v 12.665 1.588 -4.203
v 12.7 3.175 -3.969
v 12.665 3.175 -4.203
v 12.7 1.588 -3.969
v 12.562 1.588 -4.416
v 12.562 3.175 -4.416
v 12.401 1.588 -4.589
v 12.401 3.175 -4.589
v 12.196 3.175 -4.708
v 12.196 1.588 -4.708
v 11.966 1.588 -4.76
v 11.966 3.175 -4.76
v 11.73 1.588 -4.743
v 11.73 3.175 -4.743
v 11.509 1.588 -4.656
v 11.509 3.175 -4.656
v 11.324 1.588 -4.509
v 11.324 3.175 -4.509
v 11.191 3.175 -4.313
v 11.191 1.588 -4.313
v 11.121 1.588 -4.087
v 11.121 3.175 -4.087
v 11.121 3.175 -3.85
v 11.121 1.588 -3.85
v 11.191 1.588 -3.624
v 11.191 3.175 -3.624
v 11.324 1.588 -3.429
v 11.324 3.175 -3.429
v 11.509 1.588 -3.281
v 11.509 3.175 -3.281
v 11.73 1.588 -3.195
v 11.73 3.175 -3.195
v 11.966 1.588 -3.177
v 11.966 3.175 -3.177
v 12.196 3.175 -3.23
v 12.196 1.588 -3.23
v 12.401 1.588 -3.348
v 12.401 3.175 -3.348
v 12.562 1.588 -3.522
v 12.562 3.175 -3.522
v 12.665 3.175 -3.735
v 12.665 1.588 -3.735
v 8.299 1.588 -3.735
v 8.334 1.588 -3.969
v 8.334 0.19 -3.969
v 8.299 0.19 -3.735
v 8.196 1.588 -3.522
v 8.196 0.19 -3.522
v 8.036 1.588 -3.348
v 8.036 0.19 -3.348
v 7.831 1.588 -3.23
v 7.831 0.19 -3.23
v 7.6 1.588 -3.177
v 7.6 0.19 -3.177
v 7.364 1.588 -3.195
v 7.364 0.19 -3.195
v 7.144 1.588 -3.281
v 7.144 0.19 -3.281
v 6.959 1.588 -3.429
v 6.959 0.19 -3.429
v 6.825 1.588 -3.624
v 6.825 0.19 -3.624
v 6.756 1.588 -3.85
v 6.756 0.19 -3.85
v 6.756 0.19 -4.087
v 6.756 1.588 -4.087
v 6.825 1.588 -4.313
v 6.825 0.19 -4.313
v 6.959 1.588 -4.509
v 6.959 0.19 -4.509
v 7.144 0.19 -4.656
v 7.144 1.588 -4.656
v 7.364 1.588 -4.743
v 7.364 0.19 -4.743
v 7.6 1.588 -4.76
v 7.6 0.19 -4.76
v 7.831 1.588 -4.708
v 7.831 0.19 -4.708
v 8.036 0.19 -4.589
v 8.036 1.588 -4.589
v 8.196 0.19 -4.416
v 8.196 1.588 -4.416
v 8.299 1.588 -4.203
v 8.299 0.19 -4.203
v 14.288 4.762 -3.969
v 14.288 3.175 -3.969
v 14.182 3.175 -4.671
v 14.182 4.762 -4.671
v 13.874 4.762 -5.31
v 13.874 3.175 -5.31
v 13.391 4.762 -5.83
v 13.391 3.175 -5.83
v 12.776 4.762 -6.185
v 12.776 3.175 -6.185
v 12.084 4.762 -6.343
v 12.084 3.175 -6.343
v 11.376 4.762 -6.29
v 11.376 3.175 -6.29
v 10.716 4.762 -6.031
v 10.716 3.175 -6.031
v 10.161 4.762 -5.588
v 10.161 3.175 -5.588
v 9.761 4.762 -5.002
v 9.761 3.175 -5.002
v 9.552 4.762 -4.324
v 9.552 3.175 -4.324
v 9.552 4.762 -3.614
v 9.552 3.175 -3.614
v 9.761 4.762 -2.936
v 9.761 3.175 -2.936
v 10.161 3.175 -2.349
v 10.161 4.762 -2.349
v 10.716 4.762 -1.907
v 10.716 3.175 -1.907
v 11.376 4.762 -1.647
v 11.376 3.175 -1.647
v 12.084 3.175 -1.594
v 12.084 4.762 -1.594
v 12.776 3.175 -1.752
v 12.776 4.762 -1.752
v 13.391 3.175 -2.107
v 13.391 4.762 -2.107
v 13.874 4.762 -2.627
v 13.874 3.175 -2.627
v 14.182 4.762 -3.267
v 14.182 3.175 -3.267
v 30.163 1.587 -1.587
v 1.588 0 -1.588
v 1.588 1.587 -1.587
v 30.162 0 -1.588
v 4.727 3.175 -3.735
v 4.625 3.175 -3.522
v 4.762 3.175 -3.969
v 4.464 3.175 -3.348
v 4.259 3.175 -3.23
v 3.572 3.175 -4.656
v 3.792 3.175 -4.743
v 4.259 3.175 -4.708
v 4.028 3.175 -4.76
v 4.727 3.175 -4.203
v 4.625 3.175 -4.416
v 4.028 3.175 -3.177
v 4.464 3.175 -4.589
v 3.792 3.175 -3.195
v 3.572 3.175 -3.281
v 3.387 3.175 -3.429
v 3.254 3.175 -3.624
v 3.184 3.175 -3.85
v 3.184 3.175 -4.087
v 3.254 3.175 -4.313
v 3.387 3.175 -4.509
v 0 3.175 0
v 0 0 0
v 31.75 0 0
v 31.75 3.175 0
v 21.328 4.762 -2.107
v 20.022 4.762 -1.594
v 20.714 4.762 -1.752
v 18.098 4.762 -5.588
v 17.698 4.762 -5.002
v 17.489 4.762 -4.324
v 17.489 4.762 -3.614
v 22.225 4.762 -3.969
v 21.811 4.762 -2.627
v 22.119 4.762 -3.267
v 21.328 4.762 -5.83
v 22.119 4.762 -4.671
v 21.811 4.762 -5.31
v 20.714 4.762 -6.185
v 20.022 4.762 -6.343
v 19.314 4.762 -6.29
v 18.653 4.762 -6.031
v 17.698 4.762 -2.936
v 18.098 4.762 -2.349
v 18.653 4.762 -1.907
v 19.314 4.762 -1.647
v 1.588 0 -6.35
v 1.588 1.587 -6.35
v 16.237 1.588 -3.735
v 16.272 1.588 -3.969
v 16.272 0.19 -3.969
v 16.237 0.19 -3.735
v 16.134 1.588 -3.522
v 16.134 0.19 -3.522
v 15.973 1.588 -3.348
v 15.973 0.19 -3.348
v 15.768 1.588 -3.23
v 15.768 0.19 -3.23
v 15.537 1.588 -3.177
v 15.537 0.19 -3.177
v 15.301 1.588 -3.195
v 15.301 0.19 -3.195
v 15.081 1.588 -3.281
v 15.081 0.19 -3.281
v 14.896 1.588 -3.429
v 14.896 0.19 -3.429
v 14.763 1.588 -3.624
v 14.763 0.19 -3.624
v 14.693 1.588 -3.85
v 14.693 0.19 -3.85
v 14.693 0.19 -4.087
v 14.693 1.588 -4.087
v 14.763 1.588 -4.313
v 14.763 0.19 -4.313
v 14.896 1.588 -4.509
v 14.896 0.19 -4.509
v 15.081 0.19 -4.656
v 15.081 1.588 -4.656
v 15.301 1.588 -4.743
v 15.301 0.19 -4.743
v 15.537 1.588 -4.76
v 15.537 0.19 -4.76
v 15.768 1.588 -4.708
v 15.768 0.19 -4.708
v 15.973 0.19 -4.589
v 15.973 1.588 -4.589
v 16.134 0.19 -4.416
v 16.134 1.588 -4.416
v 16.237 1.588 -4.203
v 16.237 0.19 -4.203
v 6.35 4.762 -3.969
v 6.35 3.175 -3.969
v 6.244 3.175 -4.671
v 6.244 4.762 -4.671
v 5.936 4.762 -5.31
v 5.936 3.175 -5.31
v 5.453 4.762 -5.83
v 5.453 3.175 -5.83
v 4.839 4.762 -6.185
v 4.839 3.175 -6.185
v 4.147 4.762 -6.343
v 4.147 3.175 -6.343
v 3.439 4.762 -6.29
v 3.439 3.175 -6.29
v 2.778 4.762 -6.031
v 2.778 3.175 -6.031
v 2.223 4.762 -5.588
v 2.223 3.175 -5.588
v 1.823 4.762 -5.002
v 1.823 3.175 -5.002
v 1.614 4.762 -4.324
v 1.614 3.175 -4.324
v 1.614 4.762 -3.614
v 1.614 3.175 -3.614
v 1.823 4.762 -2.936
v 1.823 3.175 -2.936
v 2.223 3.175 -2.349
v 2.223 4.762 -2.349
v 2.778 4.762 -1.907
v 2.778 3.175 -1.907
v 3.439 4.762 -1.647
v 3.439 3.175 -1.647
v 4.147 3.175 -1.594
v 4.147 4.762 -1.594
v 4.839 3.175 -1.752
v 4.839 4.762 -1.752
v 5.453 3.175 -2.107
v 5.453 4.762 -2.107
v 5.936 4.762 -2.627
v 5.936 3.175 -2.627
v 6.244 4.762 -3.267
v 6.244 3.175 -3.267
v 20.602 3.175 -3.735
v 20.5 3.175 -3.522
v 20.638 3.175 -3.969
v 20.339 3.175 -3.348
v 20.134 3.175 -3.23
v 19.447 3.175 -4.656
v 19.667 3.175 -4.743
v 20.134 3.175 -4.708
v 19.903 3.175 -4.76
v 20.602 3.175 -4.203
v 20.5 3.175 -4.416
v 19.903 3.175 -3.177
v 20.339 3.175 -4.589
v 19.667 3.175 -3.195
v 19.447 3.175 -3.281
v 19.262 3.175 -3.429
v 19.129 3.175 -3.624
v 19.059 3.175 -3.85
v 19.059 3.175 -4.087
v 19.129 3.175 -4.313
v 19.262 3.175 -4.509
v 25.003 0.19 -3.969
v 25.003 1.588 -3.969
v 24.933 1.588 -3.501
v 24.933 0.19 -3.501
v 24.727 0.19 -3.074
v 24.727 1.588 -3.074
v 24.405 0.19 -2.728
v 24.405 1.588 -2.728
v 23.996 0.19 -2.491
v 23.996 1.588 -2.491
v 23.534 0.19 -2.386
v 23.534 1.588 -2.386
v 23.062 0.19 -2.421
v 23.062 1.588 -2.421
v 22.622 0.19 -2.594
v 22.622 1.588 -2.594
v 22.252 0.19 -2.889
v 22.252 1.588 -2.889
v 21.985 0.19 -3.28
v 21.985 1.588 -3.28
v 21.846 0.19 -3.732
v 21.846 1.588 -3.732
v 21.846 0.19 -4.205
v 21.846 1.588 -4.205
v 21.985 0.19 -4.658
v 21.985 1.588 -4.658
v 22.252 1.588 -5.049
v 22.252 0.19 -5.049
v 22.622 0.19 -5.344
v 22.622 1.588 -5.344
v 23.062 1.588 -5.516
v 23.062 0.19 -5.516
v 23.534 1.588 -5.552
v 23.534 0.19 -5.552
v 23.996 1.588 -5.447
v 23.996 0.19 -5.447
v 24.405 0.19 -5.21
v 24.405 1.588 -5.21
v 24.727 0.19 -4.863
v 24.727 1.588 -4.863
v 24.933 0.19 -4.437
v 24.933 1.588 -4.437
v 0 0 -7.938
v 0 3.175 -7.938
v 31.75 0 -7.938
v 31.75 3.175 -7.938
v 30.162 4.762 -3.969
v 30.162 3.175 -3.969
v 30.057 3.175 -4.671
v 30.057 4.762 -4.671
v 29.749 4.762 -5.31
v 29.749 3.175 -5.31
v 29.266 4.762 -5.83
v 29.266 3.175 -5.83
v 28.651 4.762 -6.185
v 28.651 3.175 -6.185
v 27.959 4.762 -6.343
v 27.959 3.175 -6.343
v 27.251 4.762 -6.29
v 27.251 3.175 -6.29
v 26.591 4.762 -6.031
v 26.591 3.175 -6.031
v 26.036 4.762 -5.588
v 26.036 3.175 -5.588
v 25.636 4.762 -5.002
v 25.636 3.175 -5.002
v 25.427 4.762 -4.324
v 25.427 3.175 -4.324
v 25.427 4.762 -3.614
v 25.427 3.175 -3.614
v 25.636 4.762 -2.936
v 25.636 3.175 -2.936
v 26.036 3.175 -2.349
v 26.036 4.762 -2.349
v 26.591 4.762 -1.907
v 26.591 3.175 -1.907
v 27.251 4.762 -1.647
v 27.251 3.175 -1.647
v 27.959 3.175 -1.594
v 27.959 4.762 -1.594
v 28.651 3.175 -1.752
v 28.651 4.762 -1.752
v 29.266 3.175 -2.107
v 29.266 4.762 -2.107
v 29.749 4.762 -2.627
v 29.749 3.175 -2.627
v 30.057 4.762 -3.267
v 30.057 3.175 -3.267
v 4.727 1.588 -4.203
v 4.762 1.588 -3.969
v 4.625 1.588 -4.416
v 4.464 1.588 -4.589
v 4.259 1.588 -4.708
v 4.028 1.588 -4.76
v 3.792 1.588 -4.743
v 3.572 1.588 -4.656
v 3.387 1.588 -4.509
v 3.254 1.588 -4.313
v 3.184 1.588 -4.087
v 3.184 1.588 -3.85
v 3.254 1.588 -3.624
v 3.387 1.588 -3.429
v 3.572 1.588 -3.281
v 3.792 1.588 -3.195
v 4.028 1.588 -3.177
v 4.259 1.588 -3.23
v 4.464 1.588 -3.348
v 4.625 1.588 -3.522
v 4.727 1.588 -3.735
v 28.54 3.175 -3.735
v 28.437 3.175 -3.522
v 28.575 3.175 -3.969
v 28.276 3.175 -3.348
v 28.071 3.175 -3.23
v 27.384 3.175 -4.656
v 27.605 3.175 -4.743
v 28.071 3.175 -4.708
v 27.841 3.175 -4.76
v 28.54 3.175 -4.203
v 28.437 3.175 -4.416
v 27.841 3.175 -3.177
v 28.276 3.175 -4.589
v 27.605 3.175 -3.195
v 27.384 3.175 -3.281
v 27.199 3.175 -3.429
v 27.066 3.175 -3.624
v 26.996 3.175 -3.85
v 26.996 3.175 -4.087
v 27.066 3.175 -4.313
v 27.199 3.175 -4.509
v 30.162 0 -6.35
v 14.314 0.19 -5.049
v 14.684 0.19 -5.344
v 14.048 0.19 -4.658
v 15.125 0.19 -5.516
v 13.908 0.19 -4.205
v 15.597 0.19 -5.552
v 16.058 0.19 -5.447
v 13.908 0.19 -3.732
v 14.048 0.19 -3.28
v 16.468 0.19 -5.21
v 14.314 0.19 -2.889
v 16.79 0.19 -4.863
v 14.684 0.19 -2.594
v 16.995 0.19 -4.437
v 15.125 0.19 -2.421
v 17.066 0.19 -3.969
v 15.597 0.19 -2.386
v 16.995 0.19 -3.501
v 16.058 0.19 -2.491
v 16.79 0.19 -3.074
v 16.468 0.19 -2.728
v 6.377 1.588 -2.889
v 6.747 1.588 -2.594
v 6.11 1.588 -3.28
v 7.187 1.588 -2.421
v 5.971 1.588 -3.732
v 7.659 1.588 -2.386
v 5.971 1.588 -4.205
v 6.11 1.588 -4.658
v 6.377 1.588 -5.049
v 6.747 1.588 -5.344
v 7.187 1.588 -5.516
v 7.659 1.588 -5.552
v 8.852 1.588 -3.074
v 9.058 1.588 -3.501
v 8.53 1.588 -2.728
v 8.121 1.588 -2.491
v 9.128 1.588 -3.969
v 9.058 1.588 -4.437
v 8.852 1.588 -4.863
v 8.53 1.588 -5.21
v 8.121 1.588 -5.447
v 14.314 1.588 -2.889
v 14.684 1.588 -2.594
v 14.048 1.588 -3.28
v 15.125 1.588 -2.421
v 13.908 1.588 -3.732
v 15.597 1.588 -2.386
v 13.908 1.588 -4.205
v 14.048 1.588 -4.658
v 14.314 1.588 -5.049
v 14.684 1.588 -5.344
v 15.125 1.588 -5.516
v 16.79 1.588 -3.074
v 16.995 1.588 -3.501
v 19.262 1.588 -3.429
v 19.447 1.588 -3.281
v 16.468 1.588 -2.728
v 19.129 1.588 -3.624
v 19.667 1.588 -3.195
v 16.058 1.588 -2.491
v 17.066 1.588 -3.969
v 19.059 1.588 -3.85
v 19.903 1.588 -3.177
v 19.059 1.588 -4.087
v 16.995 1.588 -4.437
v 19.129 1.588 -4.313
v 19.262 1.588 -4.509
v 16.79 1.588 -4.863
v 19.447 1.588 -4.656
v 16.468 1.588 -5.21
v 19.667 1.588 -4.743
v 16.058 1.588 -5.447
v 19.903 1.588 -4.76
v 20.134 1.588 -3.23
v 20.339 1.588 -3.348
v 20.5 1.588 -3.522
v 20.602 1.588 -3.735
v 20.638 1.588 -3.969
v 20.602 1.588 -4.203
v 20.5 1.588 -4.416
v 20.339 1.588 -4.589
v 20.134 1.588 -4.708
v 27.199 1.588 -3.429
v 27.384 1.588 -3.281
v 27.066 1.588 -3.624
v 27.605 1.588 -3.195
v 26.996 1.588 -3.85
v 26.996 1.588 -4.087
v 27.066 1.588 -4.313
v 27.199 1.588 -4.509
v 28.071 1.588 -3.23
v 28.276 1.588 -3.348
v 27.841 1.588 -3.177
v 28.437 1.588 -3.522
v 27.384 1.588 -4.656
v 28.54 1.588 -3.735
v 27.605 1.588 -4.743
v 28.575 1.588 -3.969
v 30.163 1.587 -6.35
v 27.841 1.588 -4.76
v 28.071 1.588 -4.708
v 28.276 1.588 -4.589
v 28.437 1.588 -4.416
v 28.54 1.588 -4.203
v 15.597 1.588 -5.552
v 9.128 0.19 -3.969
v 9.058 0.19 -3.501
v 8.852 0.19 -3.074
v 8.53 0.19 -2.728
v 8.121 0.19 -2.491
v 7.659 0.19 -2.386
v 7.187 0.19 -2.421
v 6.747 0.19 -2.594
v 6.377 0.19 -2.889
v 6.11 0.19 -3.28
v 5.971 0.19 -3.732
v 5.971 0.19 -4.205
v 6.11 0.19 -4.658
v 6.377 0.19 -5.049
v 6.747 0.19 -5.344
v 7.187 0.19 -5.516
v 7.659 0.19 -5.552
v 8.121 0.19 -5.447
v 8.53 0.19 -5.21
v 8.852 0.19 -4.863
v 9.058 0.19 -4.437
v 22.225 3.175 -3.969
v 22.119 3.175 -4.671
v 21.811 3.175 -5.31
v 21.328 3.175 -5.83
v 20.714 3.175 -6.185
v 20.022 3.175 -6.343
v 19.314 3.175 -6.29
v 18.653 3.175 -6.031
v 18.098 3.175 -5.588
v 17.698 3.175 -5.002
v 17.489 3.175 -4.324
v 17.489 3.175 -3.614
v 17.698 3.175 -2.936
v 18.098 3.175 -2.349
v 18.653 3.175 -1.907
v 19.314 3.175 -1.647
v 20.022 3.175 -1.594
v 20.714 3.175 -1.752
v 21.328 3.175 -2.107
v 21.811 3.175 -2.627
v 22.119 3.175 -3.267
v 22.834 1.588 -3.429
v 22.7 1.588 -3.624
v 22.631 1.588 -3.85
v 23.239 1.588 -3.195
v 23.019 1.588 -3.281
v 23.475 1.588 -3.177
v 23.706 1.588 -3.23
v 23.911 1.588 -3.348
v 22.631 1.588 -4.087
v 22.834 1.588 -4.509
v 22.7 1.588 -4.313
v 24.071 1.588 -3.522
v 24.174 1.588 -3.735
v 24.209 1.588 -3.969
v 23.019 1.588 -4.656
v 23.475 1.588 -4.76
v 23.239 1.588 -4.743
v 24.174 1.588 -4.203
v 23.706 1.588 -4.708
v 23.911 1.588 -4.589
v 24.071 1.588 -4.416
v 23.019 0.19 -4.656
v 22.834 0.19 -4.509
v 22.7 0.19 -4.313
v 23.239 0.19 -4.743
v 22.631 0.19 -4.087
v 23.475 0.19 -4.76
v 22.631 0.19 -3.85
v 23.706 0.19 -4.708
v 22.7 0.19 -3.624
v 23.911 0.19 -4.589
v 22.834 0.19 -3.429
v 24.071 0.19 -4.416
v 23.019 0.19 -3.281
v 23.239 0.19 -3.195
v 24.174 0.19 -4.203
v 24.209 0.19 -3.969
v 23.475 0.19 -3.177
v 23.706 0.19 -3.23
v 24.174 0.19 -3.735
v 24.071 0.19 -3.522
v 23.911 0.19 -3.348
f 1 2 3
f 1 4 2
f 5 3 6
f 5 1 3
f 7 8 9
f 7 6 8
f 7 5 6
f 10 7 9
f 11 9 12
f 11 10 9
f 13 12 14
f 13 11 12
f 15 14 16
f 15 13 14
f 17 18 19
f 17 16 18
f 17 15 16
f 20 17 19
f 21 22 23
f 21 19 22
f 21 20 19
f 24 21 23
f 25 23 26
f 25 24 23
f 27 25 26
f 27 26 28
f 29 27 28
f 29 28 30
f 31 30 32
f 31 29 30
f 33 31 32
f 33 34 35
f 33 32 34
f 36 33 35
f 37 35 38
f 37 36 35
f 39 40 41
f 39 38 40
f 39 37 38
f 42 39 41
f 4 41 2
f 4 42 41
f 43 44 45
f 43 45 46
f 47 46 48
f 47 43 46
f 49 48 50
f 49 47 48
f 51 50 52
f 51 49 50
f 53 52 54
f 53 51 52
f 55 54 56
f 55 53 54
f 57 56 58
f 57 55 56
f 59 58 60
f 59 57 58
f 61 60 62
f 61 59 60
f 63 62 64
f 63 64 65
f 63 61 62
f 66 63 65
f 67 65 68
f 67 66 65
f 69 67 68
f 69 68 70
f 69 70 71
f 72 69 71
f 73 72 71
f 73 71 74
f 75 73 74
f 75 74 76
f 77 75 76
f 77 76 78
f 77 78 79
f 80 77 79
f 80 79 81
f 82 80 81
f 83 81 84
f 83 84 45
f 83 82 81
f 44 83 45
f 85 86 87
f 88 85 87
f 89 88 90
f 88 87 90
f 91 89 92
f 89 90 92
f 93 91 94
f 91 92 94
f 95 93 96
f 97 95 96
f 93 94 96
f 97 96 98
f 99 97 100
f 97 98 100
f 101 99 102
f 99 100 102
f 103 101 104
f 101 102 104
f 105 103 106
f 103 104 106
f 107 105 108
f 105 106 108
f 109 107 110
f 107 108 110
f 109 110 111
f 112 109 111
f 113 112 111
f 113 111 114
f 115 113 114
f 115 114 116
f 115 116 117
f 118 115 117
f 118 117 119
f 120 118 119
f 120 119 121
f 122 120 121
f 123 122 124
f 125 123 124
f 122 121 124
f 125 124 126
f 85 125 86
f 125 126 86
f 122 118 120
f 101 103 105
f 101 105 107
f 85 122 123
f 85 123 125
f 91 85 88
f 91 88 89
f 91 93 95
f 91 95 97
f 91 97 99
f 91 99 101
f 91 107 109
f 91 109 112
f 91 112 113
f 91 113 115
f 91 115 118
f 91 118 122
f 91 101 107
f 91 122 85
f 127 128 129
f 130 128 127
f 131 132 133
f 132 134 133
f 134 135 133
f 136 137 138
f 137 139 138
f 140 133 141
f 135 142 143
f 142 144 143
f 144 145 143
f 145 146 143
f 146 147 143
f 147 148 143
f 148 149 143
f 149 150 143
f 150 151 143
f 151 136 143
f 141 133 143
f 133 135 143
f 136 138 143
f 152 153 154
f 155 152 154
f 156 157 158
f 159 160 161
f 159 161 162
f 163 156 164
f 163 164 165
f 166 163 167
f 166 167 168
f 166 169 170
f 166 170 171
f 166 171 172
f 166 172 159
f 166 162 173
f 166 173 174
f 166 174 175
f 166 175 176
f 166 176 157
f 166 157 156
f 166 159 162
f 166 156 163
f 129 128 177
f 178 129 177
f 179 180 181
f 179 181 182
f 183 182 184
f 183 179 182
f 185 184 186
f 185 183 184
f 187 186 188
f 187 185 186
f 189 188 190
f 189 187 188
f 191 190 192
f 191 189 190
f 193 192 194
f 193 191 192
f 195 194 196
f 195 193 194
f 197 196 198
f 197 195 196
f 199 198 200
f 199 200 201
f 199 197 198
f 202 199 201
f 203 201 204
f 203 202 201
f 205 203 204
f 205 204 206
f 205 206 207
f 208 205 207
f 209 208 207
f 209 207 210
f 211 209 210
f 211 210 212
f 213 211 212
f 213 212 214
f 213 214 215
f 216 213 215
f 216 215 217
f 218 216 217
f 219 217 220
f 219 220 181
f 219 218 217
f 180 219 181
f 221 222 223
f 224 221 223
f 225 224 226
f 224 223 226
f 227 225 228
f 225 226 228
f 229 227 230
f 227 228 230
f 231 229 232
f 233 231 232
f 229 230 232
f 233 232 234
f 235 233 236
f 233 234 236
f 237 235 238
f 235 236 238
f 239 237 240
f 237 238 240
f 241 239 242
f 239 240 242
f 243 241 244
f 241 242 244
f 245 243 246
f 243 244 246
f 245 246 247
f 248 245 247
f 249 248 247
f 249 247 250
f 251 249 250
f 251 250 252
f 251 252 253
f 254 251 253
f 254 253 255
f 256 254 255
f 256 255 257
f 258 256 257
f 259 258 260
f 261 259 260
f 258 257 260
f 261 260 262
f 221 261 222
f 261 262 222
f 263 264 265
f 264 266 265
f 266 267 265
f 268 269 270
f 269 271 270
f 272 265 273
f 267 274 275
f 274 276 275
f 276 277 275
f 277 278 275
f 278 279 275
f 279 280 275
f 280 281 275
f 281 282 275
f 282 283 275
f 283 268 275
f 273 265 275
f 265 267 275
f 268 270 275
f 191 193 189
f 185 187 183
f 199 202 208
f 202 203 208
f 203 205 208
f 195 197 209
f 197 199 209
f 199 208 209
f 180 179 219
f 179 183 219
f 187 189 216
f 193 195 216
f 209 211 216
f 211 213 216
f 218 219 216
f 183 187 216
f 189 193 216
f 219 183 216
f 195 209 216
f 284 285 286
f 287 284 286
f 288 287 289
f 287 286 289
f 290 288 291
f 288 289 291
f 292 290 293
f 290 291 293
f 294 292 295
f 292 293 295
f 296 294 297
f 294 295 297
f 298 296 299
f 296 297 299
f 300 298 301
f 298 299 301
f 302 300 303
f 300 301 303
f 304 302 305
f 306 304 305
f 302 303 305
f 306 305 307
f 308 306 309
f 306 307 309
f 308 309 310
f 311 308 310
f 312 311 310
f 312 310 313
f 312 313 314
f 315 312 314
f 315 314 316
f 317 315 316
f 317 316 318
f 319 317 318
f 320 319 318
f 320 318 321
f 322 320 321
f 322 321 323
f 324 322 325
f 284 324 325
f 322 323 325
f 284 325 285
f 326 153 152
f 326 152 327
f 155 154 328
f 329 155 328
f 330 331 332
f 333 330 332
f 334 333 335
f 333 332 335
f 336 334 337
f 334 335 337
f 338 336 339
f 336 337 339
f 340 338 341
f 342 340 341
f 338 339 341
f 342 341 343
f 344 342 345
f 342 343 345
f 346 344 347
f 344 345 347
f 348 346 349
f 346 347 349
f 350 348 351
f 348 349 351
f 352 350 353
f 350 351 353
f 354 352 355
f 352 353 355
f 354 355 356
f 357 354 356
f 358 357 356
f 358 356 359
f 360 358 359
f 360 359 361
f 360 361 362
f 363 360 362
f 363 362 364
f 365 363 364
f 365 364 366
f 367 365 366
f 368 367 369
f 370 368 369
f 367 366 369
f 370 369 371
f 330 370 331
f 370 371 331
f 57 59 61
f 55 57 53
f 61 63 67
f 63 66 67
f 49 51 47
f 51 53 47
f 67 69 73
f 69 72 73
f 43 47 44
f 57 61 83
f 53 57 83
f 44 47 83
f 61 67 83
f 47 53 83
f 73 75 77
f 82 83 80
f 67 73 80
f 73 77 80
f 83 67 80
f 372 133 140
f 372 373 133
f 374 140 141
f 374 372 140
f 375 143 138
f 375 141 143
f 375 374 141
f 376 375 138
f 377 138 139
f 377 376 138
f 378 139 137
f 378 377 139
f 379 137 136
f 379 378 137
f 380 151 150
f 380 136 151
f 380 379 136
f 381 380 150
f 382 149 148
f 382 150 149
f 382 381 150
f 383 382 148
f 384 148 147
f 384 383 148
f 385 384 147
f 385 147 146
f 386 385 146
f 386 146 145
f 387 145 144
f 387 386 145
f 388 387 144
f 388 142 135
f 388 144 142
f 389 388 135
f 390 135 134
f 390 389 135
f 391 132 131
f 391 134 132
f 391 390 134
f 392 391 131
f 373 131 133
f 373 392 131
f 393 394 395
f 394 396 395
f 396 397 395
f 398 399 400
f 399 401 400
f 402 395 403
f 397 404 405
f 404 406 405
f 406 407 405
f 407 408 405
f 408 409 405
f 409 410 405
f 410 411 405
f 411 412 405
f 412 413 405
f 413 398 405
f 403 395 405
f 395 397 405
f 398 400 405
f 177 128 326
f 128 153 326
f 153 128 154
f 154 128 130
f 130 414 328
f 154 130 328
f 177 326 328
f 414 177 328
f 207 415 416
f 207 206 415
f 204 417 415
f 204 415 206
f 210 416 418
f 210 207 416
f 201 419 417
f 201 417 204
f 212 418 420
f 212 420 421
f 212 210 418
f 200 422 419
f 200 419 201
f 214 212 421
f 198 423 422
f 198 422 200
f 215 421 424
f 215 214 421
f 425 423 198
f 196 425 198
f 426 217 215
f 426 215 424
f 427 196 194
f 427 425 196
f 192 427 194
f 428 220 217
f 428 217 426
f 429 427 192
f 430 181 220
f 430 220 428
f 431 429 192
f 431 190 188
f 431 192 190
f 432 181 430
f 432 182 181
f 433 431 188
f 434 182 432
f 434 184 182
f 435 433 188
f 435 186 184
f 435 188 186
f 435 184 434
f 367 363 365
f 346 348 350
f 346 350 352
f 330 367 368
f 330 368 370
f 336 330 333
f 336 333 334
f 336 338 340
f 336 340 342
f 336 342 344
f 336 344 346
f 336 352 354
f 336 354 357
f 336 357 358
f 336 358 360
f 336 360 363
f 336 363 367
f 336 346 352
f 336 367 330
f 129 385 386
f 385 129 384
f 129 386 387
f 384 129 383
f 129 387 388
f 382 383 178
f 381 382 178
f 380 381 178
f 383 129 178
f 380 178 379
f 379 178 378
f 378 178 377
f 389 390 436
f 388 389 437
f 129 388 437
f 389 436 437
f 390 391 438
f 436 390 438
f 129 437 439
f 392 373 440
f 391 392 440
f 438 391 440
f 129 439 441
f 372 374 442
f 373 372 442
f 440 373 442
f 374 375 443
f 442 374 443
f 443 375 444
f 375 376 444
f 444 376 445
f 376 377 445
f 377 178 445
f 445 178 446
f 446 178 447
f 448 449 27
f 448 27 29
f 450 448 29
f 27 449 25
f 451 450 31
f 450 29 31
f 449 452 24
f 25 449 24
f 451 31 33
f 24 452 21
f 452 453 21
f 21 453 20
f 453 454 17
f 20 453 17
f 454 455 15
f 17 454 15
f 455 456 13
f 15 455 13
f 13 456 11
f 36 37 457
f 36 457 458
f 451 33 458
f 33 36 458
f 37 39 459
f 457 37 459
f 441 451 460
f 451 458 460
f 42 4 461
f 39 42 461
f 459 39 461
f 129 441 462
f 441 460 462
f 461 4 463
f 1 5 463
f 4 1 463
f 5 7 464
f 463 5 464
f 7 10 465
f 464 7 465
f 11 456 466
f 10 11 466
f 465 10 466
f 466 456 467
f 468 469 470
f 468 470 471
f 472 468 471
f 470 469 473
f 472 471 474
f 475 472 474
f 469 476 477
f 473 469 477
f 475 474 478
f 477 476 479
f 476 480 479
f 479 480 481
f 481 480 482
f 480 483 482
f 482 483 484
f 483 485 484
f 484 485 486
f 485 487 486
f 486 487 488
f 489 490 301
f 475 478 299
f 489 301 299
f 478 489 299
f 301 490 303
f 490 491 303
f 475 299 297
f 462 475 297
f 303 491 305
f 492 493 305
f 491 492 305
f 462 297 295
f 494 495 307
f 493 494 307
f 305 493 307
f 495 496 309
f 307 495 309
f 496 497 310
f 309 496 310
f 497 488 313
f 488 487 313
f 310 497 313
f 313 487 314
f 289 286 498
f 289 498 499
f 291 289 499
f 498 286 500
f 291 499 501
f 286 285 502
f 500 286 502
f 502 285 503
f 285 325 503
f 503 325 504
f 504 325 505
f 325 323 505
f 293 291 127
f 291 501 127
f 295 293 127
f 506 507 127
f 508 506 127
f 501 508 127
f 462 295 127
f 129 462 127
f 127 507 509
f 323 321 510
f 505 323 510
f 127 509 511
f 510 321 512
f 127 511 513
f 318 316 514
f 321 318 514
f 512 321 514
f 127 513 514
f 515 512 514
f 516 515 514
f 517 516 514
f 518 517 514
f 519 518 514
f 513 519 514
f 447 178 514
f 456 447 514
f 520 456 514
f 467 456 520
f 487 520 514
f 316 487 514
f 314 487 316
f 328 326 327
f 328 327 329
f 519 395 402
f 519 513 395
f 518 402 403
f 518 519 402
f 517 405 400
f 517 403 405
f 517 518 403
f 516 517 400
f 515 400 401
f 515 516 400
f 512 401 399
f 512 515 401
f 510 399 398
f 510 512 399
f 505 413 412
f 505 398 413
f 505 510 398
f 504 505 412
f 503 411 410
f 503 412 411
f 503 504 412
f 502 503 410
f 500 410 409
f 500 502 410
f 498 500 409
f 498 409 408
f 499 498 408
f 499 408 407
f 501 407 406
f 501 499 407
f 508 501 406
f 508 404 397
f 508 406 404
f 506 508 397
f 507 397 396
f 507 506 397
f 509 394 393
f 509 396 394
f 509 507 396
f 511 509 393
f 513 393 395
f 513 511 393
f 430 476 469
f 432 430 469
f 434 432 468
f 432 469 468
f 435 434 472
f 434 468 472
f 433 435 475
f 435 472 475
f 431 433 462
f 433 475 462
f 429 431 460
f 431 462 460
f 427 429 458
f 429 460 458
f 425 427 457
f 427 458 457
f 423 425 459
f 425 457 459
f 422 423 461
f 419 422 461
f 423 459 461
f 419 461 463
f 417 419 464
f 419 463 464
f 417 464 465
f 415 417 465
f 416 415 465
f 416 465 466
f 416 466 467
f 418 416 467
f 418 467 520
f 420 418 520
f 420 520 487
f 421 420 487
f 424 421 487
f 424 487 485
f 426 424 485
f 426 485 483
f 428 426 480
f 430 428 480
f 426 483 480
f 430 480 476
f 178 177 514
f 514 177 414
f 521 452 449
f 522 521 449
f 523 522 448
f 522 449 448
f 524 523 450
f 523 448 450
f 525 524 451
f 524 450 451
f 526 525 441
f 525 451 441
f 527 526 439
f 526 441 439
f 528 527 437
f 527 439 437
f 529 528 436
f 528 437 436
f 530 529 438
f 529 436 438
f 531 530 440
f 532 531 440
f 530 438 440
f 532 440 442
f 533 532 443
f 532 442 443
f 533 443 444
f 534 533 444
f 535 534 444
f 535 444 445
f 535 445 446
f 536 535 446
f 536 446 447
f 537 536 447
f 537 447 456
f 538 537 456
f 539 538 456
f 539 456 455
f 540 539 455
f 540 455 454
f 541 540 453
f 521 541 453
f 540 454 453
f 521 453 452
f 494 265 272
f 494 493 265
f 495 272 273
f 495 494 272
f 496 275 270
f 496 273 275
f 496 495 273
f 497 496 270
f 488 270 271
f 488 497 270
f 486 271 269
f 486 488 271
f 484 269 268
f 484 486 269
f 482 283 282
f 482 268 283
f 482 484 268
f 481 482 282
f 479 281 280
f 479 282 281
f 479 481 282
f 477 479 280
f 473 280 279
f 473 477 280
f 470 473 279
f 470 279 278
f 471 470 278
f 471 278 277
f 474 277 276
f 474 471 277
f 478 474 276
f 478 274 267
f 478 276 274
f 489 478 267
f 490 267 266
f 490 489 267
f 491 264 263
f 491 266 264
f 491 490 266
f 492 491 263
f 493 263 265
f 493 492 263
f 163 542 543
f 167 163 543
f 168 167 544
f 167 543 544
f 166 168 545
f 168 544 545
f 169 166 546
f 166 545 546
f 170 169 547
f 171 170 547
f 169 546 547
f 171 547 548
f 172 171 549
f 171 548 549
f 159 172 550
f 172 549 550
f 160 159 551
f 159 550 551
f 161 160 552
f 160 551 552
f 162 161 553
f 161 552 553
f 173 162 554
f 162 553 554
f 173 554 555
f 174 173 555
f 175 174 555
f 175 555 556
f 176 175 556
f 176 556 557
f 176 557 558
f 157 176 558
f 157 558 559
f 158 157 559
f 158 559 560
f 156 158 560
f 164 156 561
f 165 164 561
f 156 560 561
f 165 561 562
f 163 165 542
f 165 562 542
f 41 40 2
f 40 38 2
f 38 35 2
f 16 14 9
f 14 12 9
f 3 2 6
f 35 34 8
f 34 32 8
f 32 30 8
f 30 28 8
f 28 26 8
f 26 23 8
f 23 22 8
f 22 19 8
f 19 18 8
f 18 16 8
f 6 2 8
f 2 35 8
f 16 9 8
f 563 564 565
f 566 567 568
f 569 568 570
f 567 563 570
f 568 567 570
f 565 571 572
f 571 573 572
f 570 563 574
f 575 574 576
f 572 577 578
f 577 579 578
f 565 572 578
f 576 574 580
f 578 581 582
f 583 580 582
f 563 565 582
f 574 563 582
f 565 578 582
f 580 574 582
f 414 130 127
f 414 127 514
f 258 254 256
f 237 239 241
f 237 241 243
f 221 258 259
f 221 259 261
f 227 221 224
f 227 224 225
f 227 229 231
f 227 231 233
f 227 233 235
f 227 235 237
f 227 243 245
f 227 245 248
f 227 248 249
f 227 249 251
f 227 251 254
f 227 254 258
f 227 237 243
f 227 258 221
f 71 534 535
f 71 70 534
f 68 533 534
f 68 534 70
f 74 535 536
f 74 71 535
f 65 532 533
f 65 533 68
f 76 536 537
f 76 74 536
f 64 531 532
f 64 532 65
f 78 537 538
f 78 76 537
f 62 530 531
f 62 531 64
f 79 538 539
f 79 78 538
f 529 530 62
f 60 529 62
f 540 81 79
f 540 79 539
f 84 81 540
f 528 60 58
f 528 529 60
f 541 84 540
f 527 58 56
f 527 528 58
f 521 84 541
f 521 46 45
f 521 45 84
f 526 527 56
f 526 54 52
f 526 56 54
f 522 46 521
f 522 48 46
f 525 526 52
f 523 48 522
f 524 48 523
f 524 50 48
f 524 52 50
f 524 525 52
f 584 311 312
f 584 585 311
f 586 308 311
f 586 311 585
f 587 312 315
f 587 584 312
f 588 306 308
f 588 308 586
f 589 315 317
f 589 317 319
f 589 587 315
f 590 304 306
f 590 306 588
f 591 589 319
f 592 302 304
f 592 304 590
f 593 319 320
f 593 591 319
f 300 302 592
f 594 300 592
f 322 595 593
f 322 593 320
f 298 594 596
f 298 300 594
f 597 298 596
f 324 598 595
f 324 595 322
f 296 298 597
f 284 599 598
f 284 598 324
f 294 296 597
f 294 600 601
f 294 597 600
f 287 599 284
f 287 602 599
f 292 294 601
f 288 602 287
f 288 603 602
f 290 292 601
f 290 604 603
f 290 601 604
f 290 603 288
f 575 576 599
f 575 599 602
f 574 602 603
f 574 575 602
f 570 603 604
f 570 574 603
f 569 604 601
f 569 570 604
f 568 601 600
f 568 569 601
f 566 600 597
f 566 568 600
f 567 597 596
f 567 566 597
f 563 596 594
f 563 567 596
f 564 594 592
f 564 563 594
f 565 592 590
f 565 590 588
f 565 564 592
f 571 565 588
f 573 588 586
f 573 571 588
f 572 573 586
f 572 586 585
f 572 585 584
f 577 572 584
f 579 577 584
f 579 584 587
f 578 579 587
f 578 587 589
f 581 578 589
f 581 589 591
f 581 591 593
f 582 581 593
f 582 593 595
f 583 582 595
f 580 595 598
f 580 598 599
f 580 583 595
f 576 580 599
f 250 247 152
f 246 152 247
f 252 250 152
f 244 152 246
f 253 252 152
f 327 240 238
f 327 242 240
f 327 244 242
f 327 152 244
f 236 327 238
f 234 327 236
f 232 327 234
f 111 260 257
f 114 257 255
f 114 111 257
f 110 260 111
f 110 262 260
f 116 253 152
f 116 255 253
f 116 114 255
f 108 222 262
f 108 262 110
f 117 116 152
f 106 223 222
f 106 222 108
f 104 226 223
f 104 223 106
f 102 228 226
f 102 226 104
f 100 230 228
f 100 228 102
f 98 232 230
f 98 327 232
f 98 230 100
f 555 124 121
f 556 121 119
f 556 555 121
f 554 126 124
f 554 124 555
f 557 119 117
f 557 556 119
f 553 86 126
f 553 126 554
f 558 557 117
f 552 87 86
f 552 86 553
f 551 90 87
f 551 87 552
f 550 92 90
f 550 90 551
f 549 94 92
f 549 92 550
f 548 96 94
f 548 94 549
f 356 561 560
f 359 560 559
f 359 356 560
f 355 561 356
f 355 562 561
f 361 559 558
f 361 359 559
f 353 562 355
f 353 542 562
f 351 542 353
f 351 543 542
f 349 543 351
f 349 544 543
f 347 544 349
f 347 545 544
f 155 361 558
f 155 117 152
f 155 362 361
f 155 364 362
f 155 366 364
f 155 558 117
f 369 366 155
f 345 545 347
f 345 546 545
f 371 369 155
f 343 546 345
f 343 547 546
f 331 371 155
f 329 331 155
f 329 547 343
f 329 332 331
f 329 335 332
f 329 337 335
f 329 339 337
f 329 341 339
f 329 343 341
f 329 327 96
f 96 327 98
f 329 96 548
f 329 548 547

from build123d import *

# Parameters (mm, degrees)
SKETCH1_W           = 31.75
SKETCH1_H           = 7.9375
BOSS_EXTRUDE1_DEPTH = 3.175
SKETCH2_R           = 2.38125
BOSS_EXTRUDE2_DEPTH = 1.5875
SHELL1_T            = -1.5875
SKETCH3_R           = 1.5875
SKETCH3_R_2         = 0.79375
BOSS_EXTRUDE4_DEPTH = 1.397


with BuildPart() as part:
    # Sketch1 → Boss-Extrude1 (new body)
    with BuildSketch(Plane(origin=(0, 0, 0), x_dir=(1, 0, 0), z_dir=(0, 1, 0))):
        with Locations((15.875, 3.96875)):
            Rectangle(SKETCH1_W, SKETCH1_H)
    extrude(amount=BOSS_EXTRUDE1_DEPTH)

    # Sketch2 → Boss-Extrude2 (add)
    with BuildSketch(Plane(origin=(0, 3.175, 0), x_dir=(1, 0, 0), z_dir=(0, 1, 0))):
        with Locations((3.96875, 3.96875)):
            Circle(SKETCH2_R)
        with Locations((11.90625, 3.96875)):
            Circle(SKETCH2_R)
        with Locations((19.84375, 3.96875)):
            Circle(SKETCH2_R)
        with Locations((27.78125, 3.96875)):
            Circle(SKETCH2_R)
    extrude(amount=BOSS_EXTRUDE2_DEPTH)

    # Shell1
    shell1_openings = [part.faces().sort_by_distance(p)[0] for p in [
        (15.875, 0, -3.96875),
    ]]
    offset(amount=SHELL1_T, openings=shell1_openings, kind=Kind.INTERSECTION)

    # Sketch3 → Boss-Extrude4 (add)
    with BuildSketch(Plane.XZ.offset(-1.5875)):
        with Locations((7.540625, -3.96875)):
            Circle(SKETCH3_R)
        with Locations((7.540625, -3.96875)):
            Circle(SKETCH3_R_2, mode=Mode.SUBTRACT)
        with Locations((15.478125, -3.96875)):
            Circle(SKETCH3_R)
        with Locations((15.478125, -3.96875)):
            Circle(SKETCH3_R_2, mode=Mode.SUBTRACT)
        with Locations((23.415625, -3.96875)):
            Circle(SKETCH3_R)
        with Locations((23.415625, -3.96875)):
            Circle(SKETCH3_R_2, mode=Mode.SUBTRACT)
    extrude(amount=BOSS_EXTRUDE4_DEPTH)


solid = part.part
